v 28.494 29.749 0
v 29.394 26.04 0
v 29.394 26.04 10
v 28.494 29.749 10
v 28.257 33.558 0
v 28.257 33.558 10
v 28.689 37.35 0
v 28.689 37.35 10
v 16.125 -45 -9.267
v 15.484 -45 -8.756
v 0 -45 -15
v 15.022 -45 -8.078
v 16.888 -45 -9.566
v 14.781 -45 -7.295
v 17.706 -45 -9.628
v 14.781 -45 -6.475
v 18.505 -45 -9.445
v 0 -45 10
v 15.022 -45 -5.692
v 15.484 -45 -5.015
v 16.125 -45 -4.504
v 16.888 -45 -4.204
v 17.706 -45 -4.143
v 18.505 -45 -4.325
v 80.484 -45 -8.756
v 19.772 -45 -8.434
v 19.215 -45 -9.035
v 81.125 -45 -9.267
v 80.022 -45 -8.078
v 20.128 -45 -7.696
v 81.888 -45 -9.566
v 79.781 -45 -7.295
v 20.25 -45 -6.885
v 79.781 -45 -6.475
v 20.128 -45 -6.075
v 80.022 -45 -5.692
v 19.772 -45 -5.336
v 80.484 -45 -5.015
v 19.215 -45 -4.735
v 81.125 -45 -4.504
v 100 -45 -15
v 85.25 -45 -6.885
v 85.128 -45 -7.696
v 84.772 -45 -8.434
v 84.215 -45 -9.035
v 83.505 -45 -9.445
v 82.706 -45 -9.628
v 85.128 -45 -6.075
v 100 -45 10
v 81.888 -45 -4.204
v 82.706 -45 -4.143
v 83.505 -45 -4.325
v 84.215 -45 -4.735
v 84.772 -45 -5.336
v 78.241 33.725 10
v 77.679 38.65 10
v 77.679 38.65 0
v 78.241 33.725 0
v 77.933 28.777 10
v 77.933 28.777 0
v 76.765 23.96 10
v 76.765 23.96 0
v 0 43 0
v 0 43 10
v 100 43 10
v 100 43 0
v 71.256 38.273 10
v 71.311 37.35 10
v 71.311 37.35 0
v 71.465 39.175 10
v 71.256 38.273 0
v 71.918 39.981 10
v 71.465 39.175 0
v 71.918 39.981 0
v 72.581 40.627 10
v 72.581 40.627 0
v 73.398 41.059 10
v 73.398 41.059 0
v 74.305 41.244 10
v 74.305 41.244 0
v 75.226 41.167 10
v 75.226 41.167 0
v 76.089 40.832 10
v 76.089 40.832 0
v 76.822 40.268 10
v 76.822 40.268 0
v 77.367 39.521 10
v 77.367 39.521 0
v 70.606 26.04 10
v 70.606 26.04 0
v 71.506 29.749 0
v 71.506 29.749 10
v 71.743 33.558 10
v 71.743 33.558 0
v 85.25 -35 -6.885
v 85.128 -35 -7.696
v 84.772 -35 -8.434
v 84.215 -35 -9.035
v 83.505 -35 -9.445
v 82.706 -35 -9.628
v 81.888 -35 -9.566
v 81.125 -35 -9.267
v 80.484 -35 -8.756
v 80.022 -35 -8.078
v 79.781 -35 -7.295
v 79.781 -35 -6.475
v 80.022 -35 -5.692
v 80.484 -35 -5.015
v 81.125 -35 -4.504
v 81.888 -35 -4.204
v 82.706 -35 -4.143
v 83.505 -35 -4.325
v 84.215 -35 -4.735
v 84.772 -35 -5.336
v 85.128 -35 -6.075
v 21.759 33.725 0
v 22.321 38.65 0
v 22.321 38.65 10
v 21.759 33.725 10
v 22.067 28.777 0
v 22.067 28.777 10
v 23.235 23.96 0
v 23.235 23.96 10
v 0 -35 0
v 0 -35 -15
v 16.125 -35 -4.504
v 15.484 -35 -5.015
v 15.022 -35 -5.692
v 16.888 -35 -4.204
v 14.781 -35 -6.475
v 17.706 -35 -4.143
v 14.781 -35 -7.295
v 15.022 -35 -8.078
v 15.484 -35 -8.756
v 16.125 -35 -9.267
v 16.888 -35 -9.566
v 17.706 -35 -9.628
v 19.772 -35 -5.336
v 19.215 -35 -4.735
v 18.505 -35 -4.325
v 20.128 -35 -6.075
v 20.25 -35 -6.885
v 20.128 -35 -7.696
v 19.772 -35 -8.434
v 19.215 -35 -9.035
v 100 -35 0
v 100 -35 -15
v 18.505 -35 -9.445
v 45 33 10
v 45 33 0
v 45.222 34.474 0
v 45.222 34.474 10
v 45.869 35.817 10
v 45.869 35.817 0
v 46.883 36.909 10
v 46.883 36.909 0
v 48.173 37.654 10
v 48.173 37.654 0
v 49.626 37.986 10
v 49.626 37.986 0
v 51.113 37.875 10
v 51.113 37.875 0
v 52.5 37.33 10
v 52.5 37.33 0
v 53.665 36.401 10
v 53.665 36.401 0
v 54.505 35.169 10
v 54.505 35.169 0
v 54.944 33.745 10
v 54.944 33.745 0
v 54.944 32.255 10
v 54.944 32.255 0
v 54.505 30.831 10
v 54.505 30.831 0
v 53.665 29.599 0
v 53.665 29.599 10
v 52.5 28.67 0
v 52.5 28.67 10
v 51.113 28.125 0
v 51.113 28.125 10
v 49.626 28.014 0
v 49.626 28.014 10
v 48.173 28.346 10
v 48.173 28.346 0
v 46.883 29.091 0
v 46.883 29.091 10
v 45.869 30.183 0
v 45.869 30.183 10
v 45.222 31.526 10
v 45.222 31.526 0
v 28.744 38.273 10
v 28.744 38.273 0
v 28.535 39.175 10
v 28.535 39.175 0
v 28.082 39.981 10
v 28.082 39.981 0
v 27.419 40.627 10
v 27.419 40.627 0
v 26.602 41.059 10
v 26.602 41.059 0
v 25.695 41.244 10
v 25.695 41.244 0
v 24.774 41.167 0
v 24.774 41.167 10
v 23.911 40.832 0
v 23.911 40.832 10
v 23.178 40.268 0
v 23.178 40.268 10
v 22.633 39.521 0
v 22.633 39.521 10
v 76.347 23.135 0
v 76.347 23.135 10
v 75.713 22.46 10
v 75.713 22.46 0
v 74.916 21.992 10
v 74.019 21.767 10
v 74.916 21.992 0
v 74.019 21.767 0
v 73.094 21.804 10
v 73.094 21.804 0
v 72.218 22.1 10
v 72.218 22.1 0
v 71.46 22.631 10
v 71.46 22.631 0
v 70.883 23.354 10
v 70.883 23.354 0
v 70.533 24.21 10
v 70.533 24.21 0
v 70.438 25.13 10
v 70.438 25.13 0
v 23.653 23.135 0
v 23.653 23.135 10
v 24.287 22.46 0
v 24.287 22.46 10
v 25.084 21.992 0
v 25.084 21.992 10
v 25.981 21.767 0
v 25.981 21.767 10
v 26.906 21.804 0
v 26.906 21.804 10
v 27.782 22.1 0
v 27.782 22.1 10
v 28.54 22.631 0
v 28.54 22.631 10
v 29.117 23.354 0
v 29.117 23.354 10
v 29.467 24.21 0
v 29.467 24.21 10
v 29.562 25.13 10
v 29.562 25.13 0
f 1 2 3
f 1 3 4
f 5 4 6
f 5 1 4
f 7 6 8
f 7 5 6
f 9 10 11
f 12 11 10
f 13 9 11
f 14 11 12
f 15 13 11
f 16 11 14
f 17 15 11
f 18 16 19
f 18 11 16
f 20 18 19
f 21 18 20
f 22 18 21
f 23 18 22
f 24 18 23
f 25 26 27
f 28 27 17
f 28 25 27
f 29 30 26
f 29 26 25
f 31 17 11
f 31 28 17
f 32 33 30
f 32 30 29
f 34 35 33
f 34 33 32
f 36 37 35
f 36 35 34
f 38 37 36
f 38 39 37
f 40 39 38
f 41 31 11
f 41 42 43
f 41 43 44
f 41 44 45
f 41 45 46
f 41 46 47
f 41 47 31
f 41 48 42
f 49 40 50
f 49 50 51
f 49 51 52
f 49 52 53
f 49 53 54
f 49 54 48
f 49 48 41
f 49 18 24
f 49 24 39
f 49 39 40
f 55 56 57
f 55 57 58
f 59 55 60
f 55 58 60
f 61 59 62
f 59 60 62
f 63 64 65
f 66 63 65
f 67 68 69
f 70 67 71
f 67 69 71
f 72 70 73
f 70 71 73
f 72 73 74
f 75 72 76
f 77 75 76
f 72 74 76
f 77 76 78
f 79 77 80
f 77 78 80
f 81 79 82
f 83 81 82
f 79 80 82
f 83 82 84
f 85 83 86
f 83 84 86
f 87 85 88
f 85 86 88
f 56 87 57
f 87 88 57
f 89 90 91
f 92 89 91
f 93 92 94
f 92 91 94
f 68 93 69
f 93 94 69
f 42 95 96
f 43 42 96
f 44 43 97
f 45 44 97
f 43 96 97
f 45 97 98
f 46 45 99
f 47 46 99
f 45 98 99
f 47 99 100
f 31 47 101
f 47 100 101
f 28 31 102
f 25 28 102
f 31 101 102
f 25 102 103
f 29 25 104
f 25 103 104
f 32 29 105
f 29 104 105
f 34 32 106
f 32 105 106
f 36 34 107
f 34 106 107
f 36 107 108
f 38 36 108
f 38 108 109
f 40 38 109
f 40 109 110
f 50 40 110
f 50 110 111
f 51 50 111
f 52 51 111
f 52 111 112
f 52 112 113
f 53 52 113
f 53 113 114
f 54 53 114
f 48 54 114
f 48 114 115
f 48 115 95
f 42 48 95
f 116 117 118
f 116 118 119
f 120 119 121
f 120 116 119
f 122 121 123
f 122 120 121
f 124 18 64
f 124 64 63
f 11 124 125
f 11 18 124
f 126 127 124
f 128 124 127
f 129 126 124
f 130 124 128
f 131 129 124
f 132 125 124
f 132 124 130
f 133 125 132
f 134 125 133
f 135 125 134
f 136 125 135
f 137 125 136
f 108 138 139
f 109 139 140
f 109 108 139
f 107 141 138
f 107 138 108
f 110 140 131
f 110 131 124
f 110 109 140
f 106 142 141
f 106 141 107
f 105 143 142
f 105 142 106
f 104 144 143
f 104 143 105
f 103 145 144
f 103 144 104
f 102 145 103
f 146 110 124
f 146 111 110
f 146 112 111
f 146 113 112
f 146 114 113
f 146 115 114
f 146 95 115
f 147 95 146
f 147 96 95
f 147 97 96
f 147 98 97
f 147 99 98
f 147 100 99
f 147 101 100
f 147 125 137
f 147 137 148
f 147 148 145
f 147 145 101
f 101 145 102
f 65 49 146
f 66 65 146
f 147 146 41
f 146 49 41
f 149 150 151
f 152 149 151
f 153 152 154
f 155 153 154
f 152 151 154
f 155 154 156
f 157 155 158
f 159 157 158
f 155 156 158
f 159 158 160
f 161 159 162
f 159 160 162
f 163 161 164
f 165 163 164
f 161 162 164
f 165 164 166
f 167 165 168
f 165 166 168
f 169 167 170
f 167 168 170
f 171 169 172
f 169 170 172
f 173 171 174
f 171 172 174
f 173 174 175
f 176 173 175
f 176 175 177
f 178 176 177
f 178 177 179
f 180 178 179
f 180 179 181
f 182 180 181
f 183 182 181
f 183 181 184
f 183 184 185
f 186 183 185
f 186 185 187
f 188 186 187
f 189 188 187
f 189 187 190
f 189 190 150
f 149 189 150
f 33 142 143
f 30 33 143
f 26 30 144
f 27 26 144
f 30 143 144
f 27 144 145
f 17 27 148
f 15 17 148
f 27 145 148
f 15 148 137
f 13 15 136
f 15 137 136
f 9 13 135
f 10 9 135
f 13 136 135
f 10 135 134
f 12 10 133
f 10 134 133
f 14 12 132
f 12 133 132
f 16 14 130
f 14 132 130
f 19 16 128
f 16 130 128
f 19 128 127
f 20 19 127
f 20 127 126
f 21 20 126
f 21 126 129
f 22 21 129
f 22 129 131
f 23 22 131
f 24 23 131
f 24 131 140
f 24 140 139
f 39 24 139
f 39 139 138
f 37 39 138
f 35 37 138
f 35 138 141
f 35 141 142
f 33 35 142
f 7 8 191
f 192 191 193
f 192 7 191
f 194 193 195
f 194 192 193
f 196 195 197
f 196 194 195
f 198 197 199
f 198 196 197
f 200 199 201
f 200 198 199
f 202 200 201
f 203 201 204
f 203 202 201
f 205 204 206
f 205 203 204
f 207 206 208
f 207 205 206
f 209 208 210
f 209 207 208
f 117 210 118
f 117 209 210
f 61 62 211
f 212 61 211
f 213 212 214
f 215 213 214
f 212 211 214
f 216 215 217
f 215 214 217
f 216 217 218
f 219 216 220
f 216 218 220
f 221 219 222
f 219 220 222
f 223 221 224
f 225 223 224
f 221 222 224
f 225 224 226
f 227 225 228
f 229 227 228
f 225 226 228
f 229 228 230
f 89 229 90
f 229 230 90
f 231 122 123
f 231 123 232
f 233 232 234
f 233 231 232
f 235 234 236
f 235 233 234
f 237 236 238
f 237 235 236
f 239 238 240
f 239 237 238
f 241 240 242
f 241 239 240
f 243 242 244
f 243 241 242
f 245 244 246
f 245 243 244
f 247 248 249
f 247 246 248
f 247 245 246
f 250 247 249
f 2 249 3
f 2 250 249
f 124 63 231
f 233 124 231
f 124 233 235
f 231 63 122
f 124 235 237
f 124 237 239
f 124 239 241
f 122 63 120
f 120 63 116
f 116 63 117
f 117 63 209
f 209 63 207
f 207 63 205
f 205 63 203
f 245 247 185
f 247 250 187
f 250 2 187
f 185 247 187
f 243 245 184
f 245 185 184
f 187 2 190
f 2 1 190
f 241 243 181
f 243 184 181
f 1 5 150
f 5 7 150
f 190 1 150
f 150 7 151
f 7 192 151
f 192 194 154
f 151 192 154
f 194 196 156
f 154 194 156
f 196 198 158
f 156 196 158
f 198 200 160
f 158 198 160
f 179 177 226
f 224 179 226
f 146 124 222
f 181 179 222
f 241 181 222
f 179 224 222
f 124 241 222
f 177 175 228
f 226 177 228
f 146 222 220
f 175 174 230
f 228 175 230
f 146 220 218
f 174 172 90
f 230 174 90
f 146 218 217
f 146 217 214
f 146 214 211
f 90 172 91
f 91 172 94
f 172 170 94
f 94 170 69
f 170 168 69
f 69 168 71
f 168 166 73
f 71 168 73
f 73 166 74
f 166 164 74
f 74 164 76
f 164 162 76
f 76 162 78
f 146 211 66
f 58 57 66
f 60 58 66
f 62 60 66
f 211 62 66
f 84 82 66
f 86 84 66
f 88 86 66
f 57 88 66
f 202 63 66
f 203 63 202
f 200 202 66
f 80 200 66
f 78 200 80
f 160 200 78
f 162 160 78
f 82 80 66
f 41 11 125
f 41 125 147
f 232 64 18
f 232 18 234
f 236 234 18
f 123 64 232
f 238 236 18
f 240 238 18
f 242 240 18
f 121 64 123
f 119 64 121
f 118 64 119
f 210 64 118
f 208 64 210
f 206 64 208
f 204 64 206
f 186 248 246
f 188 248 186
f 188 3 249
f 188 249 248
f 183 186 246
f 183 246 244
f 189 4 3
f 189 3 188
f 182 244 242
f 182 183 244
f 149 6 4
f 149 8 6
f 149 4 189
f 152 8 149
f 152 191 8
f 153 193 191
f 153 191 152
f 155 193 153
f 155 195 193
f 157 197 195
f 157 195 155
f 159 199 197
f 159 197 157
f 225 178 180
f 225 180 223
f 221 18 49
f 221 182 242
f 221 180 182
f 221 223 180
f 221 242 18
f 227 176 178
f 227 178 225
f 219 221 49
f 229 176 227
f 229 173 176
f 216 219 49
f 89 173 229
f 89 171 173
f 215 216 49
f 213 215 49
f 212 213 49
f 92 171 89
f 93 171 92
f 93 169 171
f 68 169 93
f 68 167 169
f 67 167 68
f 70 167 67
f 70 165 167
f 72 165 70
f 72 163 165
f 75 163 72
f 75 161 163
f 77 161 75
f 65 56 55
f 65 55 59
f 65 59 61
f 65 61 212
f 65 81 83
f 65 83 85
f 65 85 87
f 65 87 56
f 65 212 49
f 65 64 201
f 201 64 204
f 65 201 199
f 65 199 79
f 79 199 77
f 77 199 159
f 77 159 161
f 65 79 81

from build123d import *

# Parameters (mm, degrees)
EXTRUDE_1_DEPTH     = 10
SKETCH_2_W          = 169.882057187
SKETCH_2_H          = 25.097327733
CUT_EXTRUDE_1_DEPTH = 11
SKETCH_4_W          = 150
SKETCH_4_H          = 103
EXTRUDE_2_DEPTH     = 10
SKETCH_5_W          = 50
SKETCH_5_H          = 103
CUT_EXTRUDE_2_DEPTH = 11
SKETCH_7_W          = 130.949422717
SKETCH_7_H          = 60
CUT_EXTRUDE_3_DEPTH = 10
SKETCH_8_R          = 5
CUT_EXTRUDE_4_DEPTH = 11
CUT_EXTRUDE_5_DEPTH = 11
SKETCH_12_W         = 100
SKETCH_12_H         = 10
EXTRUDE_3_DEPTH     = 45
SKETCH_13_W         = 100
SKETCH_13_H         = 5
EXTRUDE_4_DEPTH     = 25
SKETCH_14_W         = 100
SKETCH_14_H         = 15
EXTRUDE_5_DEPTH     = 5
SKETCH_15_R         = 2.75
CUT_EXTRUDE_6_DEPTH = 11


with BuildPart() as part:
    # 草图1 → 凸台-拉伸1 (new body)
    with BuildSketch(Plane.XY):
        Polygon((150, 103.55), (0, 90.426700471), (0, 0), (150, 0), align=None)
    extrude(amount=EXTRUDE_1_DEPTH)

    # 草图2 → 切除-拉伸1 (cut, through all)
    with BuildSketch(Plane(origin=(0, 0, 0), x_dir=(-1, 0, 0), z_dir=(0, 0, -1))):
        with Locations((-84.941028594, 102.975364337)):
            Rectangle(SKETCH_2_W, SKETCH_2_H)
    extrude(amount=-CUT_EXTRUDE_1_DEPTH, mode=Mode.SUBTRACT)

    # 草图4 → 凸台-拉伸2 (add)
    with BuildSketch(Plane.XY.offset(10)):
        with Locations((75, 51.5)):
            Rectangle(SKETCH_4_W, SKETCH_4_H)
    extrude(amount=-EXTRUDE_2_DEPTH)

    # 草图5 → 切除-拉伸2 (cut, through all)
    with BuildSketch(Plane.XY.offset(10)):
        with Locations((125, 51.5)):
            Rectangle(SKETCH_5_W, SKETCH_5_H)
    extrude(amount=-CUT_EXTRUDE_2_DEPTH, mode=Mode.SUBTRACT)

    # 草图7 → 切除-拉伸3 (cut)
    with BuildSketch(Plane.XY.offset(10)):
        with Locations((65.474711359, 73)):
            Rectangle(SKETCH_7_W, SKETCH_7_H)
    extrude(amount=-CUT_EXTRUDE_3_DEPTH, mode=Mode.SUBTRACT)

    # 草图8 → 切除-拉伸4 (cut, through all)
    with BuildSketch(Plane(origin=(0, 0, 0), x_dir=(-1, 0, 0), z_dir=(0, 0, -1))):
        with Locations((-50, 33)):
            Circle(SKETCH_8_R)
    extrude(amount=-CUT_EXTRUDE_4_DEPTH, mode=Mode.SUBTRACT)

    # 草图11 → 切除-拉伸5 (cut, through all)
    with BuildSketch(Plane(origin=(0, 0, 0), x_dir=(-1, 0, 0), z_dir=(0, 0, -1))):
        with BuildLine():
            ThreePointArc((-76.764545578, 23.96), (-72.645438565, 21.920892987), (-70.606331551, 26.04))
            ThreePointArc((-70.606331551, 26.04), (-71.707959146, 31.648330774), (-71.310560762, 37.35))
            ThreePointArc((-71.310560762, 37.35), (-73.844897428, 41.184336666), (-77.679234093, 38.65))
            ThreePointArc((-77.679234093, 38.65), (-78.195395213, 31.24438365), (-76.764545578, 23.96))
        make_face()
    cut_extrude_5 = extrude(amount=-CUT_EXTRUDE_5_DEPTH, mode=Mode.SUBTRACT)

    # 镜向1: 切除-拉伸5 across plane
    add(cut_extrude_5.mirror(Plane.ZY.offset(-50)), mode=Mode.SUBTRACT)

    # 草图12 → 凸台-拉伸3 (add)
    with BuildSketch(Plane.XZ):
        with Locations((50, 5)):
            Rectangle(SKETCH_12_W, SKETCH_12_H)
    extrude(amount=EXTRUDE_3_DEPTH)

    # 草图13 → 凸台-拉伸4 (add)
    with BuildSketch(Plane.XY.offset(10)):
        with Locations((50, -42.5)):
            Rectangle(SKETCH_13_W, SKETCH_13_H)
    extrude(amount=-EXTRUDE_4_DEPTH)

    # 草图14 → 凸台-拉伸5 (add)
    with BuildSketch(Plane(origin=(0, -40, 0), x_dir=(1, 0, 0), z_dir=(0, 1, 0))):
        with Locations((50, 7.5)):
            Rectangle(SKETCH_14_W, SKETCH_14_H)
    extrude(amount=EXTRUDE_5_DEPTH)

    # 草图15 → 切除-拉伸6 (cut, through all)
    with BuildSketch(Plane(origin=(0, -35, 0), x_dir=(1, 0, 0), z_dir=(0, 1, 0))):
        with Locations((82.5, 6.885250494)):
            Circle(SKETCH_15_R)
        with Locations((17.5, 6.885250494)):
            Circle(SKETCH_15_R)
    extrude(amount=-CUT_EXTRUDE_6_DEPTH, mode=Mode.SUBTRACT)


solid = part.part
